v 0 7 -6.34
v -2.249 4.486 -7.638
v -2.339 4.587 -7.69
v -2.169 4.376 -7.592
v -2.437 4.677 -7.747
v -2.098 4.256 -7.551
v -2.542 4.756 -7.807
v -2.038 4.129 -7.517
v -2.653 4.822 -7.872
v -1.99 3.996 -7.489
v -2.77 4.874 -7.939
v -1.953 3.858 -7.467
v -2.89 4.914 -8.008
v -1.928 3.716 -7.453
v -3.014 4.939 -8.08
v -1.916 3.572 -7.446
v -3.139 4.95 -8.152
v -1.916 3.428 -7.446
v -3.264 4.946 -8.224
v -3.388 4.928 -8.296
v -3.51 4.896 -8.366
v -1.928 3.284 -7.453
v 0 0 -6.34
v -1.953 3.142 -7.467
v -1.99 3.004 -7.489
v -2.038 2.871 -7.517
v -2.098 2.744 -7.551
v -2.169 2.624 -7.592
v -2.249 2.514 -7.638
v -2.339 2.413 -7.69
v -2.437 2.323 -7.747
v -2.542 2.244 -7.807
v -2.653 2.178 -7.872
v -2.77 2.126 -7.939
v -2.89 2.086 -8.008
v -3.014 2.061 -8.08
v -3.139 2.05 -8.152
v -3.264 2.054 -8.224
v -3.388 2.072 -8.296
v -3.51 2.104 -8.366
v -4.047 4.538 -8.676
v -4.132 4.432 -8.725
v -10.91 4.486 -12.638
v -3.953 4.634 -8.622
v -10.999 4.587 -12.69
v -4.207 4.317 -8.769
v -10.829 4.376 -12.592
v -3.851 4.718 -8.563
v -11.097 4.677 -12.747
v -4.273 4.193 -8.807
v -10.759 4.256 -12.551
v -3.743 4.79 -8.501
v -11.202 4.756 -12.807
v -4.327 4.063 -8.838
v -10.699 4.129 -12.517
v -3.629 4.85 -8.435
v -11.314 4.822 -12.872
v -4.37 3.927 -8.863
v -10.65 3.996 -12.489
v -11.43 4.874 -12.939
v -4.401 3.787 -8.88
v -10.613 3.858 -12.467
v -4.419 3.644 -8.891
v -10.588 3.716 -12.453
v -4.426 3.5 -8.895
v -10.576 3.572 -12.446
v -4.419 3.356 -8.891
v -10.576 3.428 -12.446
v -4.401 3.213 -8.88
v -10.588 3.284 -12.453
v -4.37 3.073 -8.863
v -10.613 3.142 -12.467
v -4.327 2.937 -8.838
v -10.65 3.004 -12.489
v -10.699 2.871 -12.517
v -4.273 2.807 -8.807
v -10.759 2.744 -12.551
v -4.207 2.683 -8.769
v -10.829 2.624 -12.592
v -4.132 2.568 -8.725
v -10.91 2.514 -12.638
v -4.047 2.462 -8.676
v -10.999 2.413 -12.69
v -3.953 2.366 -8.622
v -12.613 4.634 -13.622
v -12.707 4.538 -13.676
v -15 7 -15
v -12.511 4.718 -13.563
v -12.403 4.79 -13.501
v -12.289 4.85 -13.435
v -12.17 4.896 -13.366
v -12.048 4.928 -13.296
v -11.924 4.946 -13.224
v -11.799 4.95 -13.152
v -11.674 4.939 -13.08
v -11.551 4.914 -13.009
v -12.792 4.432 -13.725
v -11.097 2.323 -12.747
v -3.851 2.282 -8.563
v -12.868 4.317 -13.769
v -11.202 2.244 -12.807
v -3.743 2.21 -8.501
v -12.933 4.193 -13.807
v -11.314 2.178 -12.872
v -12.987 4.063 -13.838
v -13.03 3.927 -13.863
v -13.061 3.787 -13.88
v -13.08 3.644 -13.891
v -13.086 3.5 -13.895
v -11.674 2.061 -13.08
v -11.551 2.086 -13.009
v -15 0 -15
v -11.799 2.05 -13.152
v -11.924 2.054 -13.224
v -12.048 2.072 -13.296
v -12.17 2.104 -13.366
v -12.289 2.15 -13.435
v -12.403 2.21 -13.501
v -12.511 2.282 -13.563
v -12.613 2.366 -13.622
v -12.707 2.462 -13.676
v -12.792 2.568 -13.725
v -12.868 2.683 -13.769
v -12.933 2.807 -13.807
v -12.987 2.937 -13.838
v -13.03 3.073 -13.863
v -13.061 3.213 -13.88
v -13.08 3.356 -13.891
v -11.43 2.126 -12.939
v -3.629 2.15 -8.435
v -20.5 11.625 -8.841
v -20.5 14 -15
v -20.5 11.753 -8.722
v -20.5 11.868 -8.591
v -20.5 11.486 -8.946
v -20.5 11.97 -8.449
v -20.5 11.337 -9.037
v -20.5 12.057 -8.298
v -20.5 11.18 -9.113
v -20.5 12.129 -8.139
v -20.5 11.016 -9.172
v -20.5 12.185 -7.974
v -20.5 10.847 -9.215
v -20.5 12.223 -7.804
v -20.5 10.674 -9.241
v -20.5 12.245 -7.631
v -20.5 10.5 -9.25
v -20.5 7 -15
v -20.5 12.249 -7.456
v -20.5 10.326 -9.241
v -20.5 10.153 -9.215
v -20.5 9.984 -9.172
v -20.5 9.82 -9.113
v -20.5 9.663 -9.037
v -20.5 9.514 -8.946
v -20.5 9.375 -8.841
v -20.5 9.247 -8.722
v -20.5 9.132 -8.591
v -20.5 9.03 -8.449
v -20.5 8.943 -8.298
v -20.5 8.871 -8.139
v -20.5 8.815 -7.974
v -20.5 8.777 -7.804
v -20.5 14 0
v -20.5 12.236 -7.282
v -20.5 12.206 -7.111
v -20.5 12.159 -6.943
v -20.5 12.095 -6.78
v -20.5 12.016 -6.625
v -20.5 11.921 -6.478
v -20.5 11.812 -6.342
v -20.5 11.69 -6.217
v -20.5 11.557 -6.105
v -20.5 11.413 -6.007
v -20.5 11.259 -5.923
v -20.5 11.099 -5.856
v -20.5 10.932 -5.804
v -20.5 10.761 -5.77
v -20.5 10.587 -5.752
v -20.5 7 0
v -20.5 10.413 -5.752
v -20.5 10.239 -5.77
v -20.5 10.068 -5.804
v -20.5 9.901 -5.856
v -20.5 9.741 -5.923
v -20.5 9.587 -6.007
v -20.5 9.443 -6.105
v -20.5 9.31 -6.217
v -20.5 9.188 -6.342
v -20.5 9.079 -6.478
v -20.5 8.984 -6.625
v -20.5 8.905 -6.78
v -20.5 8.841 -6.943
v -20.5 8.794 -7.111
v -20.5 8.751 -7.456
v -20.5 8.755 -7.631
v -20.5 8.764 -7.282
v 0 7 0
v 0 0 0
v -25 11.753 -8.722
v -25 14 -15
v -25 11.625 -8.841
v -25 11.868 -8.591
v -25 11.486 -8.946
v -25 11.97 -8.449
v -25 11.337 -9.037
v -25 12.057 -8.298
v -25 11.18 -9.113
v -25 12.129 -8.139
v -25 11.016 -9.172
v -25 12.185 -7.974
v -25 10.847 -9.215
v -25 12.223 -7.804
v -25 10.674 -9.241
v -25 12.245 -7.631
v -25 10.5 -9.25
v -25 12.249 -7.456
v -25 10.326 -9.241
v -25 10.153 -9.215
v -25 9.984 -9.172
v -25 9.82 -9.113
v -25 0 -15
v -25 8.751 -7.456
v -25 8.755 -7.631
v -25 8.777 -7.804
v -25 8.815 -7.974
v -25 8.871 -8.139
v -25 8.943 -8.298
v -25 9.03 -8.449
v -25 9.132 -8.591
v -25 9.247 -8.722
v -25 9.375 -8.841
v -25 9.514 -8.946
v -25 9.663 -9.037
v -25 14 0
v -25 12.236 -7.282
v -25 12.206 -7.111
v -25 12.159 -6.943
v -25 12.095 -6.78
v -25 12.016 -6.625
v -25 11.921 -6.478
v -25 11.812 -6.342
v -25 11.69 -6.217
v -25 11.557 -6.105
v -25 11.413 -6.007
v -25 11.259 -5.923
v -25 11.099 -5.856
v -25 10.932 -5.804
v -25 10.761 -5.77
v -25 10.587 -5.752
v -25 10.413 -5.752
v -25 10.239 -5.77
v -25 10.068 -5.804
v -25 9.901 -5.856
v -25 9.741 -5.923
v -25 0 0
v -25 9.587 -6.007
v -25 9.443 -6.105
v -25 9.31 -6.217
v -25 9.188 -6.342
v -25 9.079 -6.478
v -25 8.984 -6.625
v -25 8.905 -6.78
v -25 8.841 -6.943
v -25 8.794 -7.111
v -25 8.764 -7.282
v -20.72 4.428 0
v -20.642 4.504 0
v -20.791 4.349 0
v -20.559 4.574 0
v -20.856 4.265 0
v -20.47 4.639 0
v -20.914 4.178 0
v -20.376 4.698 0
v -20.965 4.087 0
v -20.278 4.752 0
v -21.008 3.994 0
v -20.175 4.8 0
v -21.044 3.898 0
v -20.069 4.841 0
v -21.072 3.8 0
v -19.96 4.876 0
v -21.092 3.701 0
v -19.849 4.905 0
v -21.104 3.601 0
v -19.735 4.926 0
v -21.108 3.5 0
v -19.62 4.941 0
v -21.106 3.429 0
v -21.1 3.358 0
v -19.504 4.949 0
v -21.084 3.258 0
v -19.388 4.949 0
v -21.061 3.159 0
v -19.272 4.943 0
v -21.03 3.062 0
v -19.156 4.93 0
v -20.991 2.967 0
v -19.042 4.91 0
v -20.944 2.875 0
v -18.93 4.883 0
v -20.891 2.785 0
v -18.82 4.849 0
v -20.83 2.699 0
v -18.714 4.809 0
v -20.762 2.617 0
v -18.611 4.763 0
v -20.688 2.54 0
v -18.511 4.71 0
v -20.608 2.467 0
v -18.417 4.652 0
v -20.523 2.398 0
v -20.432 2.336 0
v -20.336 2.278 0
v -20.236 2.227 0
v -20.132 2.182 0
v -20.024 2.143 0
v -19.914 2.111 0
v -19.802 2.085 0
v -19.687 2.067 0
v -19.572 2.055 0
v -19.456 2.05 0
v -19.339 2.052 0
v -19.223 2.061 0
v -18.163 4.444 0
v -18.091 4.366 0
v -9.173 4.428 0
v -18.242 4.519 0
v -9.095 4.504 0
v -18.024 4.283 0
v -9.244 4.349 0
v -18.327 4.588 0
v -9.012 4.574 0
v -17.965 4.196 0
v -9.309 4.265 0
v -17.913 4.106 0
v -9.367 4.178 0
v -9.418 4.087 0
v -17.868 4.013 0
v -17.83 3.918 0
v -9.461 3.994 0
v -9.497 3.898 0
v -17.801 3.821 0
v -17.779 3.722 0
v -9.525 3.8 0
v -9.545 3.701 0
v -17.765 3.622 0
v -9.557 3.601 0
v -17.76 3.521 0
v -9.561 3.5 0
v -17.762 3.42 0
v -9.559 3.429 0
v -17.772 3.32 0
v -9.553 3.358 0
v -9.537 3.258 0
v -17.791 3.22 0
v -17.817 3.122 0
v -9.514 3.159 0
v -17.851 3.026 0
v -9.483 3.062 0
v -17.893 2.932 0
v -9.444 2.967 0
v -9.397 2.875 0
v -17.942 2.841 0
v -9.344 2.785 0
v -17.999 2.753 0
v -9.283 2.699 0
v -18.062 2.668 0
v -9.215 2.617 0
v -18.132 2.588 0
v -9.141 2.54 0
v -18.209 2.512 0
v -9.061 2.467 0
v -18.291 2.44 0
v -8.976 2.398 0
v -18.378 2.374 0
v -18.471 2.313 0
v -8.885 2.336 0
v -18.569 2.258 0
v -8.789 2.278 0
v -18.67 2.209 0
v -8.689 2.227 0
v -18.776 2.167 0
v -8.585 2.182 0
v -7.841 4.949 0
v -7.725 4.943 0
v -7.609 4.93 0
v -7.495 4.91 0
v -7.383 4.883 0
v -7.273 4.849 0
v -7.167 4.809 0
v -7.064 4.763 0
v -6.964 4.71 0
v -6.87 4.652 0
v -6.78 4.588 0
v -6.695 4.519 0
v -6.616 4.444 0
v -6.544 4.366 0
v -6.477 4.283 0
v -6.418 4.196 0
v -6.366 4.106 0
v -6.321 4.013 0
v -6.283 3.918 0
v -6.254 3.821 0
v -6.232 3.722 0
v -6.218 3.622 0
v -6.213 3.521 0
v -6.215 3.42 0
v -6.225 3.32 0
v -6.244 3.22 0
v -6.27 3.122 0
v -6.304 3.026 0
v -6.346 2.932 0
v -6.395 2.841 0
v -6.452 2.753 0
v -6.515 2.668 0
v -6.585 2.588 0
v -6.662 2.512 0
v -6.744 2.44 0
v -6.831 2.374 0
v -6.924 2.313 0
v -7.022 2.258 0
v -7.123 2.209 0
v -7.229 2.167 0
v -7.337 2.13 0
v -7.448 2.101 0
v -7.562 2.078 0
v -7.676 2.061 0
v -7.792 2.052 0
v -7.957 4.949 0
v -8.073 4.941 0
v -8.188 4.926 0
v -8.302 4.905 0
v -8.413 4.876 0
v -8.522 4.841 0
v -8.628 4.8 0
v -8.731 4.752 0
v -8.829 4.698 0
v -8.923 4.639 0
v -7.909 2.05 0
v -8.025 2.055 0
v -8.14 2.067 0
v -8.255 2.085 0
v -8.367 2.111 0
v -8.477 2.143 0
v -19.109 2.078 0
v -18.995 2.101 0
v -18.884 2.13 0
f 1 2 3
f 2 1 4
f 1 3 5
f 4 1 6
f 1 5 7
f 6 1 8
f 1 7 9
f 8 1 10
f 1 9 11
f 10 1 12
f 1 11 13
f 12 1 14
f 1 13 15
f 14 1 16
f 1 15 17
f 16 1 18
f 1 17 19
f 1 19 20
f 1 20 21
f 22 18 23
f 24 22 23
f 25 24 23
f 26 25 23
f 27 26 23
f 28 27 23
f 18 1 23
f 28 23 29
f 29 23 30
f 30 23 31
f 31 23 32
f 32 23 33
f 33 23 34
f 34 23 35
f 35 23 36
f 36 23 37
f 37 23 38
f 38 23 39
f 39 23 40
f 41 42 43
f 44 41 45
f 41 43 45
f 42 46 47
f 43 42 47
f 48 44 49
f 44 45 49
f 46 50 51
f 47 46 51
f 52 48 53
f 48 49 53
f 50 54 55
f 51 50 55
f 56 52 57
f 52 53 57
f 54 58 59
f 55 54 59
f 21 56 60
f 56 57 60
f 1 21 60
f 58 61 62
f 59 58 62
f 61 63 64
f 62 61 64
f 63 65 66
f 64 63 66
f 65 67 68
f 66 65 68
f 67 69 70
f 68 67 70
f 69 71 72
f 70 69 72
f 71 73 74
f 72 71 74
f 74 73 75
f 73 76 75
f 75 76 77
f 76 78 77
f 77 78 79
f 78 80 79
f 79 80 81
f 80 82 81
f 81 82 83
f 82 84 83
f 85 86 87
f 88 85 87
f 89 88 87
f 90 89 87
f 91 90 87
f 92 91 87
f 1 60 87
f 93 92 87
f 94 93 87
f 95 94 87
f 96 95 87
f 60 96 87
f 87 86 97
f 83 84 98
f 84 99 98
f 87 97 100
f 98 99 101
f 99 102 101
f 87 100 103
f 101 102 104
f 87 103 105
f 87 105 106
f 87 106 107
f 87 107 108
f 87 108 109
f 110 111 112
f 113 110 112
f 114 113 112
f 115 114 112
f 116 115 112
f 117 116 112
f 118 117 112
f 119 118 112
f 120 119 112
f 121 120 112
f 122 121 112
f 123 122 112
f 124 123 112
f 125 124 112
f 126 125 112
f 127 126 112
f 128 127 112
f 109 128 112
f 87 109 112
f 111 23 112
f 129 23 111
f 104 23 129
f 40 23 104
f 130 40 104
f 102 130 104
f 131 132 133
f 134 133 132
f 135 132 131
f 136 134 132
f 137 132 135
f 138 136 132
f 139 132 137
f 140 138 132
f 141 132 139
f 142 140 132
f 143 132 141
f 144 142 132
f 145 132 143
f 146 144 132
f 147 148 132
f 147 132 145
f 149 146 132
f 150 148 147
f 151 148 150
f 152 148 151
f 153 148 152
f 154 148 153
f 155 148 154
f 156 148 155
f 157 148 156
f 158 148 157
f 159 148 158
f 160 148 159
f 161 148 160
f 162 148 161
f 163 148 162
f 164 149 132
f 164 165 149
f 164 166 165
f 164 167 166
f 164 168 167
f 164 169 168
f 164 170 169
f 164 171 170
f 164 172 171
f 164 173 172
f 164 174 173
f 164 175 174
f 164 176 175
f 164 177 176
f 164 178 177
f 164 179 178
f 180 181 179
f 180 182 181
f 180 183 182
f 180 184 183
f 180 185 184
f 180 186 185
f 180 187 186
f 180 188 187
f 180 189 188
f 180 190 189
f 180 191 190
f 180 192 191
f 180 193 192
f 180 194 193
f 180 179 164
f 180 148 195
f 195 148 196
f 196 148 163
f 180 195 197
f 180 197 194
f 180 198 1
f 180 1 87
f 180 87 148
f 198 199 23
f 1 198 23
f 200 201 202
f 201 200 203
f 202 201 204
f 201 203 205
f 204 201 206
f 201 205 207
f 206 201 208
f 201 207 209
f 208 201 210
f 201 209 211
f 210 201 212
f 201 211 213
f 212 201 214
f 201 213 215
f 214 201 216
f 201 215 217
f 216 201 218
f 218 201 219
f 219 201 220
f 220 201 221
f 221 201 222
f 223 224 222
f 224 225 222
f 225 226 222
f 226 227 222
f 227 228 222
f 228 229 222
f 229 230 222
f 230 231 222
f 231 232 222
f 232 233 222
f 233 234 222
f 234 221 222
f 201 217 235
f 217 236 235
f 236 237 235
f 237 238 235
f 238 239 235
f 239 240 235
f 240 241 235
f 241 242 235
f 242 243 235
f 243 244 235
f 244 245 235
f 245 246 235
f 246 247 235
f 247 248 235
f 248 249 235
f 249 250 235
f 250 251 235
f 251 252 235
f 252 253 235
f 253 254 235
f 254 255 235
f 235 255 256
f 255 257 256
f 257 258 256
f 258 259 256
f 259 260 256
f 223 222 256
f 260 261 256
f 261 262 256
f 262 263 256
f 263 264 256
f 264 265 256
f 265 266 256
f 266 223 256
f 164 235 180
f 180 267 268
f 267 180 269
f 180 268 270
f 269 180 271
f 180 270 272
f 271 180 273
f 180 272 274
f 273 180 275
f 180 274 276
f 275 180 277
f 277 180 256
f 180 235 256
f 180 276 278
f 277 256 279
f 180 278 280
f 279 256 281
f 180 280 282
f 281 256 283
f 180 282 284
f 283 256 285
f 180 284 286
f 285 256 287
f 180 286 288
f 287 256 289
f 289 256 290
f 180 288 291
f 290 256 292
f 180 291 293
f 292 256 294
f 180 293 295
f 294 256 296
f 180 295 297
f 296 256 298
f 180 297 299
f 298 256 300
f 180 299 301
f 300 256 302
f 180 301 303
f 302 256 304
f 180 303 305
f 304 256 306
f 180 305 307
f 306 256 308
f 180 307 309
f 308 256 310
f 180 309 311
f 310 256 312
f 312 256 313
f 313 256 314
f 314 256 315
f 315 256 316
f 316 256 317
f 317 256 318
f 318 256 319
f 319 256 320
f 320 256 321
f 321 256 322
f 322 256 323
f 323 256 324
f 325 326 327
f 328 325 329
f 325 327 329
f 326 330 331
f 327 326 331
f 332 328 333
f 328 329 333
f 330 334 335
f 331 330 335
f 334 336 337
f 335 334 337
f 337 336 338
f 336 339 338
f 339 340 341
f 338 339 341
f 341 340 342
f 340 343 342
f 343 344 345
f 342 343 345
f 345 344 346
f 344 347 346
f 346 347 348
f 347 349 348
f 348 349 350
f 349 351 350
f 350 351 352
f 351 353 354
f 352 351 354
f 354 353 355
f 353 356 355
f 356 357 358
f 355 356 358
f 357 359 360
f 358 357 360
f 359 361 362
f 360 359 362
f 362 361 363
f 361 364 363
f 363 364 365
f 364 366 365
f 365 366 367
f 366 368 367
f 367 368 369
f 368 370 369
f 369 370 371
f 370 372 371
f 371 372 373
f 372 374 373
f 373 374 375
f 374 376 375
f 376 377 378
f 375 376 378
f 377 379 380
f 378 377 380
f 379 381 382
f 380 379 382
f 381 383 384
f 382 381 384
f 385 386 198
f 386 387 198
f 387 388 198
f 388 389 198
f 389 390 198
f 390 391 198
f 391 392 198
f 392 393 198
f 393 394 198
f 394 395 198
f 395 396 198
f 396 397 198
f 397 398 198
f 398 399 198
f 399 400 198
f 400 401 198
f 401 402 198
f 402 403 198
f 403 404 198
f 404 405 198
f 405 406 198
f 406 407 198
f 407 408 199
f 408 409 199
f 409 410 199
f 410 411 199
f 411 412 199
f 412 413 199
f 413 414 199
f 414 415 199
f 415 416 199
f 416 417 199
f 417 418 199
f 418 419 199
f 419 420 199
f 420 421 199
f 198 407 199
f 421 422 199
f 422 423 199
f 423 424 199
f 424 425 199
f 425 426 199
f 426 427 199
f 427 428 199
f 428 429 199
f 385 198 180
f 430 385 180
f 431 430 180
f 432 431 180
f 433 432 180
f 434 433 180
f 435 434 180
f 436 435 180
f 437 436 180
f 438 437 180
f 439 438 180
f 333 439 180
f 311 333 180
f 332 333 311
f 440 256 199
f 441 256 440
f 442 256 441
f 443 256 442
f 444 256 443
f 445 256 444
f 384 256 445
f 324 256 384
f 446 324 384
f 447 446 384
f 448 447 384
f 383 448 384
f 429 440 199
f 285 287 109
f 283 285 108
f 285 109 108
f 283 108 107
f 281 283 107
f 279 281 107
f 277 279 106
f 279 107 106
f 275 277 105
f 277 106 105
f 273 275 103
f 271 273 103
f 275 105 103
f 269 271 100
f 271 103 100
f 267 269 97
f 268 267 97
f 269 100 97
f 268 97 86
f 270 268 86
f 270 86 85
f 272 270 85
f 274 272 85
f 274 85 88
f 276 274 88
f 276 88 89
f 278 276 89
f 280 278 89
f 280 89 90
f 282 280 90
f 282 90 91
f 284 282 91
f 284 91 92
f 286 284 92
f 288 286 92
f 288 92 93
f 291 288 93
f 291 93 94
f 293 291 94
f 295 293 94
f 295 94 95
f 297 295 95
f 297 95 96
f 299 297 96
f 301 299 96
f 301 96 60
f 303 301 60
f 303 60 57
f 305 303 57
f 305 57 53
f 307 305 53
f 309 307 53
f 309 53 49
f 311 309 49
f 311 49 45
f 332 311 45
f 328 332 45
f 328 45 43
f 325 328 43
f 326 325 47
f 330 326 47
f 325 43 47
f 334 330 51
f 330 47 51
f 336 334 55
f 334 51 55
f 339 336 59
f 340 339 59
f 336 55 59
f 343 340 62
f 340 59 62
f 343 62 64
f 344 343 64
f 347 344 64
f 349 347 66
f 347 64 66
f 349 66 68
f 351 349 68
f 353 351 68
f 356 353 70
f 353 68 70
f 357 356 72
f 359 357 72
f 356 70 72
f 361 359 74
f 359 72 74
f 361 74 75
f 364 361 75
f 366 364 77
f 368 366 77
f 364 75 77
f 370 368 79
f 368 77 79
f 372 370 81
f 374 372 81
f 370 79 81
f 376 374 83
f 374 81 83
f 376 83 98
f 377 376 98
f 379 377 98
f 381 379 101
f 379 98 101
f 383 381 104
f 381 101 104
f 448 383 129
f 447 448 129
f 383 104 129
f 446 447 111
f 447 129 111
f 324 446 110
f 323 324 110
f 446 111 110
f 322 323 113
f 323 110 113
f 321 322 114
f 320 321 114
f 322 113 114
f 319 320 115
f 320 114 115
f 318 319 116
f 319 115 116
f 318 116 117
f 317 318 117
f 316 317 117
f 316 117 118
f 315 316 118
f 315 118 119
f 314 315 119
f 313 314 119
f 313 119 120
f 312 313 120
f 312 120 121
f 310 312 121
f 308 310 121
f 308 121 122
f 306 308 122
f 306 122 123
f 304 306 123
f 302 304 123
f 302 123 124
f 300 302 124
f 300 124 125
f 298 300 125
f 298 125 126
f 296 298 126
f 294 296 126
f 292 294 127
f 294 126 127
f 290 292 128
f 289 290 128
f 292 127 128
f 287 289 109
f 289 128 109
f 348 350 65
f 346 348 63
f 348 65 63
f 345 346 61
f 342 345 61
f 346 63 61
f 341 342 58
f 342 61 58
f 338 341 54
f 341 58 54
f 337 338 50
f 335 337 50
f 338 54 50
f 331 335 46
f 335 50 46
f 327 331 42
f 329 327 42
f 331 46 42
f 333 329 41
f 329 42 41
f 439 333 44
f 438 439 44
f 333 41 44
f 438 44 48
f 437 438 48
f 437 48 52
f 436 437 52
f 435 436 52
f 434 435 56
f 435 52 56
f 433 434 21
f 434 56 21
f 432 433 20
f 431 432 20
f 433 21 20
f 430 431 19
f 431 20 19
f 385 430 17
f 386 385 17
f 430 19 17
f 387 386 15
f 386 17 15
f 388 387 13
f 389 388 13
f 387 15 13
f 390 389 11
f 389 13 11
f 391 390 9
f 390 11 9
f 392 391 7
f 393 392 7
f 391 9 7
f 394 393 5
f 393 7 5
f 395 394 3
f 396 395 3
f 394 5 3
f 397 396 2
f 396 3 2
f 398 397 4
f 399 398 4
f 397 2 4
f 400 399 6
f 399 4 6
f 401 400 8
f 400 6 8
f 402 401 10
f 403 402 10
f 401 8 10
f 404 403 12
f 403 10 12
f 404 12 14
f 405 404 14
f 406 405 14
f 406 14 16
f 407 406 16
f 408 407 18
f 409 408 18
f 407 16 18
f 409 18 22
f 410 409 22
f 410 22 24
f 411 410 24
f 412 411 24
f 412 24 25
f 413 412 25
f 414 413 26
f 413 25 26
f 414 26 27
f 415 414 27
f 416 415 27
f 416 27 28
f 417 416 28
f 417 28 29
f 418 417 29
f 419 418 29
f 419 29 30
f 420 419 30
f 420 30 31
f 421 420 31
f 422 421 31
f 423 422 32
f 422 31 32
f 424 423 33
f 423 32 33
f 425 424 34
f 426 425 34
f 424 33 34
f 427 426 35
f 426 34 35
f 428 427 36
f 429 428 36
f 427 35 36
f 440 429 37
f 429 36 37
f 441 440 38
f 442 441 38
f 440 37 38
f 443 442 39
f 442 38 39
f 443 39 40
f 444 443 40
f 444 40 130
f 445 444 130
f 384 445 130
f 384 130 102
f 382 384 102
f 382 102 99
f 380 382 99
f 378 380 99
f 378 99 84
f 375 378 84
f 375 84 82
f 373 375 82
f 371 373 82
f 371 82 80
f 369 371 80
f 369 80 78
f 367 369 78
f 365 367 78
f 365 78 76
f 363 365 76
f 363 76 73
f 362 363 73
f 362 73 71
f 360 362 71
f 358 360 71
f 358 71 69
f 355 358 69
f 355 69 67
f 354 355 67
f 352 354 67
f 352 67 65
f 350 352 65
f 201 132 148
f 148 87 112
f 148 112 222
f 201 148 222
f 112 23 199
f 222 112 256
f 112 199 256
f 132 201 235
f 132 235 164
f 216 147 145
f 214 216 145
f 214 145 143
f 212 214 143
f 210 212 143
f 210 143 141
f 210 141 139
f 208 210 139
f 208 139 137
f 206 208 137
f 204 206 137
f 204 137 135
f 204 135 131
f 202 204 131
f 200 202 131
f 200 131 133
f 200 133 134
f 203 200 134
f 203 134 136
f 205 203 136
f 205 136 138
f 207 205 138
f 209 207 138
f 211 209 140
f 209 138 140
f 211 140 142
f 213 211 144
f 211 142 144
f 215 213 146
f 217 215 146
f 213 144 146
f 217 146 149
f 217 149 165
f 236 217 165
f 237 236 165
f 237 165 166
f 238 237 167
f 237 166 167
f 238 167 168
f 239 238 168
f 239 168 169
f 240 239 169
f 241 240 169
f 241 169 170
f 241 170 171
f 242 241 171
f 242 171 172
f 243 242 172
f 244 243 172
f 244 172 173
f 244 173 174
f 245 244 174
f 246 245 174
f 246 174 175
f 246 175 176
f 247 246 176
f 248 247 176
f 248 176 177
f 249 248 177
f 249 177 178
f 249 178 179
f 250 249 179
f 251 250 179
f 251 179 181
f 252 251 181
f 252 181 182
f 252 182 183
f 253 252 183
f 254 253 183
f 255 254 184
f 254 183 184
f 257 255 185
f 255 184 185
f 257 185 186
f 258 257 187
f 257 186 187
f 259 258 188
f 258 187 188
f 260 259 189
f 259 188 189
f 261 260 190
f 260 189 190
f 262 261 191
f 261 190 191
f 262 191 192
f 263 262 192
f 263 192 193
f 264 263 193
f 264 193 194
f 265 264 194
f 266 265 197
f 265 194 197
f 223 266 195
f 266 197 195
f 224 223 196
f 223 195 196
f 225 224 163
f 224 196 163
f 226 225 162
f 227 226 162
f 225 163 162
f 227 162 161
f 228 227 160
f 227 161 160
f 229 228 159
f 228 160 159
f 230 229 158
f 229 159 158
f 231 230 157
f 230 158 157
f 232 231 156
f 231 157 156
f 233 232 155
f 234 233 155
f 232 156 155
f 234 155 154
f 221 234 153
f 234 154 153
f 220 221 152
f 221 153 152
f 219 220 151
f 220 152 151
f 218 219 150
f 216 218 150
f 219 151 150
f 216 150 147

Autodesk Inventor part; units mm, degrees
ref_plane "YZ Plane" through (0, 0, 0) normal (1, 0, 0) x (0, 1, 0)
ref_plane "XZ Plane" through (0, 0, 0) normal (0, 1, 0) x (-1, 0, 0)
ref_plane "XY Plane" through (0, 0, 0) normal (0, 0, 1) x (1, 0, 0)
sketch "Sketch1" plane through (0, 0, 0) normal (0, 1, 0) x (-1, 0, 0)
  line L0 (0, 0) -> (0, -6.3397)
  line L1 (0, -6.3397) -> (15, -15)
  line L2 (25, 0) -> (0, 0)
  line L3 (25, 0) -> (25, -15)
  line L4 (25, -15) -> (15, -15)
  dimension "d1" = 60
  dimension "d25" = 15
  dimension "d26" = 10
  dimension "d27" = 15
extrude "Extrusion1" add sketch "Sketch1" along normal blind 7
sketch "Sketch2" plane through (-15, 0, -15) normal (0.5, 0, -0.866) x (-0.866, 0, -0.5)
  line L0 (-17.3205, 0) -> (0, 0) projected
  line L1 (0, 0) -> (0, 7) projected
  line L2 (-17.3205, 7) -> (0, 7) projected
  line L3 (-17.3205, 0) -> (-17.3205, 7) projected
  circle A0 centre (-3.6603, 3.5) radius 1.45
  circle A1 centre (-13.6603, 3.5) radius 1.45
  point P0 (-20.4904, 0)
  dimension "d5" = 2.9
  dimension "d6" = 10
  dimension "d8" = 7
  dimension "d9" = 3.5
  dimension "d10" = 17.3205
  dimension "d11" = 3.6603
extrude "Extrusion2" cut sketch "Sketch2" against normal through all contours A0 | A1
sketch "Sketch6" plane through (0, 7, 0) normal (0, 1, 0) x (1, 0, 0)
  line L0 (0, 0) -> (0, 6.3397) projected
  line L1 (0, 6.3397) -> (-15, 15) projected
  line L2 (-15, 15) -> (-25, 15) projected
  line L3 (-25, 15) -> (-25, 0) projected
  line L4 (-25, 0) -> (0, 0) projected
  line L5 (0, 6.3397) -> (-15, 15) projected
  line L6 (-25, 0) -> (0, 0) projected
  line L7 (-20.5, 15) -> (-20.5, 0)
  dimension "d34" = 4.5
extrude "Extrusion5" add sketch "Sketch6" along normal blind 7 contours L4 L3 L2 L7
sketch "Sketch8" plane through (-20.5, 7, 0) normal (1, 0, 0) x (0, 0, -1)
  line L0 (15, 0) -> (0, 0) projected
  line L1 (15, 0) -> (15, 7) projected
  line L2 (0, 7) -> (15, 7) projected
  line L3 (0, 0) -> (0, 7) projected
  circle A0 centre (7.5, 3.5) radius 1.75
  point P0 (0, -7)
  point P1 (0, 3.5)
  point P2 (7.5, 0)
  dimension "d35" = 3.5
extrude "Extrusion7" cut sketch "Sketch8" against normal through all contours A0
equation "\"d9\" = 0.5 * d8"
equation "\"d11\" = -0.5 * d6 + 0.5 * d10"
properties part number "LEDBracket" material "ABS Plastic"
